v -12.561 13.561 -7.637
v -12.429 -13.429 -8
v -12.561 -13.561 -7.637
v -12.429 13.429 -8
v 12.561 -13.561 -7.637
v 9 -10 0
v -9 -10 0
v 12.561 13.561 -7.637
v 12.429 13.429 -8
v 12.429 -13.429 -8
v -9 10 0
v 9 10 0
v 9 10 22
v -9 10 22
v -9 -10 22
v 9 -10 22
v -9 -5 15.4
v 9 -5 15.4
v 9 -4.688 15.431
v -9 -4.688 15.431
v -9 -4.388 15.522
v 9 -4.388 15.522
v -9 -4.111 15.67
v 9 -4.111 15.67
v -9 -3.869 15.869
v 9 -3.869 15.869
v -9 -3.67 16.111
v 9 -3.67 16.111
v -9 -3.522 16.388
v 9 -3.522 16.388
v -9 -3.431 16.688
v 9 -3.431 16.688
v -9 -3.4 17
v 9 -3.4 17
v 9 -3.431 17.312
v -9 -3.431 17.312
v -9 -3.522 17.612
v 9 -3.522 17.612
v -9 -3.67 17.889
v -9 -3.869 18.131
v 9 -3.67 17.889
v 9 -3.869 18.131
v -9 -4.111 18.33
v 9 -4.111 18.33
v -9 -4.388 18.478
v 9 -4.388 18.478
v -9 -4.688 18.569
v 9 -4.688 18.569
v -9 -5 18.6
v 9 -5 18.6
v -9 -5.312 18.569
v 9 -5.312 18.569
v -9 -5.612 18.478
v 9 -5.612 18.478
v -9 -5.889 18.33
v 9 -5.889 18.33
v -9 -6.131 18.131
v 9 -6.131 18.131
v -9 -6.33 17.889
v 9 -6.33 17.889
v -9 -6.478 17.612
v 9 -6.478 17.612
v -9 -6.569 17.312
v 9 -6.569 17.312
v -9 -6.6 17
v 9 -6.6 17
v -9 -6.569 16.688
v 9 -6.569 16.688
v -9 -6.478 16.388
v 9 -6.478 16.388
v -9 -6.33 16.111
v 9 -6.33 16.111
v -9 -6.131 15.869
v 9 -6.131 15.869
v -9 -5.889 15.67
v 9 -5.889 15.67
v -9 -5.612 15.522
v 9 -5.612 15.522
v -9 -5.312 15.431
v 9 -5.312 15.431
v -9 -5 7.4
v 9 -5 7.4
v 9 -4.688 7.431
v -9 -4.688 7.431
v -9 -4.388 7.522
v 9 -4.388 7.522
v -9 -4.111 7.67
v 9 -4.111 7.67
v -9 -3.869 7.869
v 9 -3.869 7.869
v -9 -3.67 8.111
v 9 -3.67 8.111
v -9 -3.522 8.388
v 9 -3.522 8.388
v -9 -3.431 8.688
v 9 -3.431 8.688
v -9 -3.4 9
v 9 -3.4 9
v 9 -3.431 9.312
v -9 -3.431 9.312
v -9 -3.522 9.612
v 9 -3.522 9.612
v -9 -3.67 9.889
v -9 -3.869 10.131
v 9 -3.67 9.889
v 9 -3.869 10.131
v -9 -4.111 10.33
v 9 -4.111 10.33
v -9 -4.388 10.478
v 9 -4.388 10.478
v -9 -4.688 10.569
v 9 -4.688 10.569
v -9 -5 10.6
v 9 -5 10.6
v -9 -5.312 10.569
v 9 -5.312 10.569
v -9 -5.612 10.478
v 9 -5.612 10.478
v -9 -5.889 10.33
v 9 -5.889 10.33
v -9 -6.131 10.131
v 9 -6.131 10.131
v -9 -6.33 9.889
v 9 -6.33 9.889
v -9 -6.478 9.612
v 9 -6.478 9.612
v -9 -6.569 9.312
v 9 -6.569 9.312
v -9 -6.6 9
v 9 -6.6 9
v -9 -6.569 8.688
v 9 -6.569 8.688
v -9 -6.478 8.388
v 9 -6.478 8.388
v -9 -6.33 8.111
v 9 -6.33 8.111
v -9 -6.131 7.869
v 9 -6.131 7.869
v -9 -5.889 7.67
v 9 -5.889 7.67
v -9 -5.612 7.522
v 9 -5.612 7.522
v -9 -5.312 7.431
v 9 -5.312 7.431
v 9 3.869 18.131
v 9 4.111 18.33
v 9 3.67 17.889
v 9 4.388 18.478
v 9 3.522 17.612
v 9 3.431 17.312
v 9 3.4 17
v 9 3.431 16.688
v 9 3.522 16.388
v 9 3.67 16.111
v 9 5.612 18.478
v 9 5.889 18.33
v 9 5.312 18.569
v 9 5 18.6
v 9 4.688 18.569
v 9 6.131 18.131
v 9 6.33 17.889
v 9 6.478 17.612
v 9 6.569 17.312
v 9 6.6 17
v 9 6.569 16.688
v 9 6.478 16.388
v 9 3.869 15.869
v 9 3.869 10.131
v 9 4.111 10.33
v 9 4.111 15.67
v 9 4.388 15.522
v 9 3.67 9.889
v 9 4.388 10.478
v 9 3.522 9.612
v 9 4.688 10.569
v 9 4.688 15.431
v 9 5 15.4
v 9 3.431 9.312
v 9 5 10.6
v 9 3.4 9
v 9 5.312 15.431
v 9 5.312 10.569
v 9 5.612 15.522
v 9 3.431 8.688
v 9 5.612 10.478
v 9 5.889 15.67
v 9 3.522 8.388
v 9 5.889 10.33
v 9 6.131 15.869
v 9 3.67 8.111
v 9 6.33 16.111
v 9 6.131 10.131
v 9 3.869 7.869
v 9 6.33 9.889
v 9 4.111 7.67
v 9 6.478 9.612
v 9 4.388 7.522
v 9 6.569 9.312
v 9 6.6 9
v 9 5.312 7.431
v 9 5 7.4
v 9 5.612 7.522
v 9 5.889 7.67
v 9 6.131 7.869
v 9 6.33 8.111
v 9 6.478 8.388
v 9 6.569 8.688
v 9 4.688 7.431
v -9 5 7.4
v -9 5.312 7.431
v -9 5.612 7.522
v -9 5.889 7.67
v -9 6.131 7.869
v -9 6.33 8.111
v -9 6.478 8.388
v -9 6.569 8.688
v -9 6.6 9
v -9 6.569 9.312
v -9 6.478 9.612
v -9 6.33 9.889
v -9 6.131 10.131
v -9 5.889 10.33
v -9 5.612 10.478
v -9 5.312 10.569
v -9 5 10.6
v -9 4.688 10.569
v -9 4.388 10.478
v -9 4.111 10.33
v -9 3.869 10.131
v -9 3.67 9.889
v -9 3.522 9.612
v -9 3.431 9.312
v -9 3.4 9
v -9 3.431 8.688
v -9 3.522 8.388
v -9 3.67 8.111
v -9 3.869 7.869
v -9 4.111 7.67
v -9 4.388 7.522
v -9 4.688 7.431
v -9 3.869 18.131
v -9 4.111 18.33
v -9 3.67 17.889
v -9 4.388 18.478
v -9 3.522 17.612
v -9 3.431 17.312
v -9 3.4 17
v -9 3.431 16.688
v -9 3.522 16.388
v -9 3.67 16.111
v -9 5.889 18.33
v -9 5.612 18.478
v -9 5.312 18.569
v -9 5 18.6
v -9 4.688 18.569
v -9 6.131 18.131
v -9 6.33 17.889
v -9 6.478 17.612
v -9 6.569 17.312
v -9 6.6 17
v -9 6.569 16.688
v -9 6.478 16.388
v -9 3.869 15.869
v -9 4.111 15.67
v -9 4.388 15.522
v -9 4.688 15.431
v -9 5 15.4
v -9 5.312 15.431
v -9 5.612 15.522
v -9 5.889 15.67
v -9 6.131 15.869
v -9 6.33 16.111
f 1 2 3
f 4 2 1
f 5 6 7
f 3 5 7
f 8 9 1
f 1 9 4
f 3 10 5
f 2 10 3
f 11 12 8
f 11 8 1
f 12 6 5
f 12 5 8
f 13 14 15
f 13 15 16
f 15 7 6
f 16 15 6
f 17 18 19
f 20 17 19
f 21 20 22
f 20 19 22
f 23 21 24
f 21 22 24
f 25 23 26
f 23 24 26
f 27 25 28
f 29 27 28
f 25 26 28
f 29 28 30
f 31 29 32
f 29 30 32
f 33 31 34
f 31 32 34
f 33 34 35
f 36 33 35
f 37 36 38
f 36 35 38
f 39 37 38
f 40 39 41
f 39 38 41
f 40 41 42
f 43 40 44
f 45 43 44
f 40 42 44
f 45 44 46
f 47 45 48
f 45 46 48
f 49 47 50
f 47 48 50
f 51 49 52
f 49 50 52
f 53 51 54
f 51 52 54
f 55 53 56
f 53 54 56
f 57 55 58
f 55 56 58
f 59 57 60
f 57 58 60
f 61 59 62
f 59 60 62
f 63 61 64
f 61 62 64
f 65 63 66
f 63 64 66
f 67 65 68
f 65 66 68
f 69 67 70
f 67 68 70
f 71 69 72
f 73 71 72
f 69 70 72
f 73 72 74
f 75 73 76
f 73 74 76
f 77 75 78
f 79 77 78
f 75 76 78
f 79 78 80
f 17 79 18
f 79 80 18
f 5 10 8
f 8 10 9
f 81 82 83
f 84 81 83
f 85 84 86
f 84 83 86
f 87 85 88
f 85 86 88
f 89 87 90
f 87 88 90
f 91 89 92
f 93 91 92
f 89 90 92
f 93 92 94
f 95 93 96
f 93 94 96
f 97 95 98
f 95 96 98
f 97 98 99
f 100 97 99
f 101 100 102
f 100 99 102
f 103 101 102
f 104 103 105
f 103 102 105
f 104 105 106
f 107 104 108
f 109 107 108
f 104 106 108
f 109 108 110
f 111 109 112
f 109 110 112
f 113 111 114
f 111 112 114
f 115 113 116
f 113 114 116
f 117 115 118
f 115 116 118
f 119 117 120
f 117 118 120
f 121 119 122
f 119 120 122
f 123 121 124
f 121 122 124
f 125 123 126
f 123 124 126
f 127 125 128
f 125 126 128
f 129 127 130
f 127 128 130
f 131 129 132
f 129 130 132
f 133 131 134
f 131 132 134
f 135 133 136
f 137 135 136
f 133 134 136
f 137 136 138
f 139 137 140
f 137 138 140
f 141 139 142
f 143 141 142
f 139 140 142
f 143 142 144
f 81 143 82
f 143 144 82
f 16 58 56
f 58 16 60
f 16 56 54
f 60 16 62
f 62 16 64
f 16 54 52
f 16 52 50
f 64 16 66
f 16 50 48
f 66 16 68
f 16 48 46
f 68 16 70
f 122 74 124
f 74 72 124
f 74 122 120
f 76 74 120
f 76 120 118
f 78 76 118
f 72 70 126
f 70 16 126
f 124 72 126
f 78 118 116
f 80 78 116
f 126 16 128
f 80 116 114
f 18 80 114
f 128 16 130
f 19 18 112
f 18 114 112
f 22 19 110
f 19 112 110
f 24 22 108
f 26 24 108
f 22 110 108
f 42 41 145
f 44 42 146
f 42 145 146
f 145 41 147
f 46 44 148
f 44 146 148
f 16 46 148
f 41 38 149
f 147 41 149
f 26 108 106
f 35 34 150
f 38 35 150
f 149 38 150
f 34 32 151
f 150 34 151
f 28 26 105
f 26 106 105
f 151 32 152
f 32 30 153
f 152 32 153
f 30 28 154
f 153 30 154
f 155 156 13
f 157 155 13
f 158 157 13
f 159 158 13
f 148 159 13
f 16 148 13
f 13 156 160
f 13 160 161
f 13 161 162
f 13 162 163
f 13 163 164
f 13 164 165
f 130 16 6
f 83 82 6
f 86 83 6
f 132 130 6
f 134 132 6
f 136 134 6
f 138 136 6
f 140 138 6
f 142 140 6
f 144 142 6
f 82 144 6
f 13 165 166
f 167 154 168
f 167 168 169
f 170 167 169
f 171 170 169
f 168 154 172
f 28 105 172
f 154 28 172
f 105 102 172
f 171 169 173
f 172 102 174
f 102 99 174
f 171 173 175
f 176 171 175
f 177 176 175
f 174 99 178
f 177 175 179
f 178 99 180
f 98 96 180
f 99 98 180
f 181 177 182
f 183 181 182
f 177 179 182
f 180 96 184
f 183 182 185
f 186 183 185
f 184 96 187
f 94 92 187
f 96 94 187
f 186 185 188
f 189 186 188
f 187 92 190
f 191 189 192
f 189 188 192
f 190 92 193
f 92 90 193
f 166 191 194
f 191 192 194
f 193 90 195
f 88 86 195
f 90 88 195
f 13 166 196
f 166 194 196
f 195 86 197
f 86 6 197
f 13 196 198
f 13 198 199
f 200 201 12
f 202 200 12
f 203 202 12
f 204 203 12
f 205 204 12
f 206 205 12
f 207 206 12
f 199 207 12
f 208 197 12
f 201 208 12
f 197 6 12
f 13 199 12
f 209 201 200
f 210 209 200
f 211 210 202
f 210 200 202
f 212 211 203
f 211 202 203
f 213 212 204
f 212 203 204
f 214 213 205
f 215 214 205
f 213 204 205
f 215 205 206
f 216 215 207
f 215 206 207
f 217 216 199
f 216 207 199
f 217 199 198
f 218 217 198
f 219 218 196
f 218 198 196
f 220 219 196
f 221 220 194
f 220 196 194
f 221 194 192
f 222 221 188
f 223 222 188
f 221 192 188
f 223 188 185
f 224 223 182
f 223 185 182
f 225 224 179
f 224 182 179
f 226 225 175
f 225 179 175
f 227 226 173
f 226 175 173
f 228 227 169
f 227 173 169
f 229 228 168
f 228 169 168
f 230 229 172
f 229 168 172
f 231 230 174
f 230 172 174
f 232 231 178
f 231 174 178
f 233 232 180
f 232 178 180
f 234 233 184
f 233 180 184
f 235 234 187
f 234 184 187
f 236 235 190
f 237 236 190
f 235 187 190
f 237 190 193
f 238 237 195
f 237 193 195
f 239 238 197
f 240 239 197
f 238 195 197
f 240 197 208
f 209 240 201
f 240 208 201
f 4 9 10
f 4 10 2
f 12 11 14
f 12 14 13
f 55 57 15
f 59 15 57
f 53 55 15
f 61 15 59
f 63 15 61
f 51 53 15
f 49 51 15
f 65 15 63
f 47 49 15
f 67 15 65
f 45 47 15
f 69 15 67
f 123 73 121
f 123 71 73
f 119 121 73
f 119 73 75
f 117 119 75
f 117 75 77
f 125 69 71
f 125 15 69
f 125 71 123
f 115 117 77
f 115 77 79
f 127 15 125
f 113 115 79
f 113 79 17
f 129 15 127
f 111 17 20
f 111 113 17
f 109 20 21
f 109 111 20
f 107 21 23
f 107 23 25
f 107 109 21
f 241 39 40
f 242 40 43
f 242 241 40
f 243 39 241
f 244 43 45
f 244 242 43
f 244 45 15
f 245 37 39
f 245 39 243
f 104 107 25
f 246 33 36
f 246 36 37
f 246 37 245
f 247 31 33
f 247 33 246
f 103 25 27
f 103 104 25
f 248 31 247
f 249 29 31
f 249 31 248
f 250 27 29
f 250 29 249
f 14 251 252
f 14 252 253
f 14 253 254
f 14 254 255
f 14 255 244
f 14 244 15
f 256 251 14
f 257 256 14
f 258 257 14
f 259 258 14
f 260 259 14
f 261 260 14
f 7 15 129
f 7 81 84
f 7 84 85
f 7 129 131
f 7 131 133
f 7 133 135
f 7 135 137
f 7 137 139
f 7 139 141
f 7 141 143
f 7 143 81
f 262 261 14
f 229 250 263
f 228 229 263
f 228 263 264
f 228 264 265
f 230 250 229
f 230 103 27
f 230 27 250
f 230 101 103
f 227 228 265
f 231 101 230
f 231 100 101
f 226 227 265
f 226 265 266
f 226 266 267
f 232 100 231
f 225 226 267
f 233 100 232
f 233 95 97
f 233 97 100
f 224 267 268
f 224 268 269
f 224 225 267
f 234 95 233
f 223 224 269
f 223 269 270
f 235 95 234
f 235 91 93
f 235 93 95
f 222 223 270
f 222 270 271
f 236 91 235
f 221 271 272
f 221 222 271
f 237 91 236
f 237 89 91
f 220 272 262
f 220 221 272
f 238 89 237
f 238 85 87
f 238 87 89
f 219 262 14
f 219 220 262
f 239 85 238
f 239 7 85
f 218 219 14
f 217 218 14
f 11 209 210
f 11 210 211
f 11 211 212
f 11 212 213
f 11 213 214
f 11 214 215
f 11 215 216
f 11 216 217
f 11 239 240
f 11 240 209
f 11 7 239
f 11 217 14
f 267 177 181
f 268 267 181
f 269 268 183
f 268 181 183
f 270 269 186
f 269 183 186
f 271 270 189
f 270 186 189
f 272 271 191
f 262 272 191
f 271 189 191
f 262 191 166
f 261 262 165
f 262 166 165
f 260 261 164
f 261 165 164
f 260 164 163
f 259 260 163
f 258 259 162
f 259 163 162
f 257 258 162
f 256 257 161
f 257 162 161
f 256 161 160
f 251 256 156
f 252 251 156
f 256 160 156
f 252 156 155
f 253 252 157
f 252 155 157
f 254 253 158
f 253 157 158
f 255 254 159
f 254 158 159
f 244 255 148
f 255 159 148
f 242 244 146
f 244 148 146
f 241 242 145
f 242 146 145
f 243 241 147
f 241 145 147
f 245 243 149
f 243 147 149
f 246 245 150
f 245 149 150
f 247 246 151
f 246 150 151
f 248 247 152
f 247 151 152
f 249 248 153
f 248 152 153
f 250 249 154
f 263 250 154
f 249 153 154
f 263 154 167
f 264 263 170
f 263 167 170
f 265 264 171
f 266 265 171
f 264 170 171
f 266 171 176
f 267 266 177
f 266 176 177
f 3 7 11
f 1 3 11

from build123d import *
from OCP.BRepFilletAPI import BRepFilletAPI_MakeChamfer

# Parameters (mm, degrees)
SKETCH2_W           = 18
SKETCH2_H           = 20
BOSS_EXTRUDE1_DEPTH = 22
SKETCH3_W           = 18
SKETCH3_H           = 20
BOSS_EXTRUDE2_DEPTH = 8
BOSS_EXTRUDE2_DRAFT = -25
SKETCH4_R           = 1.6
CUT_EXTRUDE1_DEPTH  = 18
CHAMFER1_SIZE       = 0.4
CHAMFER1_SIZE2      = 0.300994928


with BuildPart() as part:
    # Sketch2 → Boss-Extrude1 (new body)
    with BuildSketch(Plane.XY):
        Rectangle(SKETCH2_W, SKETCH2_H)
    extrude(amount=BOSS_EXTRUDE1_DEPTH)


with BuildPart() as boss_extrude2_tool:
    # Sketch3 → Boss-Extrude2 (with draft: the straight prism first)
    with BuildSketch(Plane(origin=(0, 0, 0), x_dir=(-1, 0, 0), z_dir=(0, 0, -1))):
        Rectangle(SKETCH3_W, SKETCH3_H)
    extrude(amount=BOSS_EXTRUDE2_DEPTH)
    # Boss-Extrude2: the draft: its side faces are tilted about the plane it starts from
    boss_extrude2_sides = [boss_extrude2_tool.faces().sort_by_distance(p)[0] for p in [
        (9, 0, -4),
        (0, -10, -4),
        (-9, 0, -4),
        (0, 10, -4),
    ]]
    draft(boss_extrude2_sides, Plane(origin=(0, 0, 0), x_dir=(-1, 0, 0), z_dir=(0, 0, -1)), BOSS_EXTRUDE2_DRAFT)


with BuildPart() as part_1:
    add(part.part)

    # Boss-Extrude2: add boss_extrude2_tool
    add(boss_extrude2_tool.part)

    # Sketch4 → Cut-Extrude1 (cut)
    with BuildSketch(Plane(origin=(9, 0, 0), x_dir=(0, 0, -1), z_dir=(1, 0, 0))):
        with Locations((-17, 5)):
            Circle(SKETCH4_R)
        with Locations((-9, 5)):
            Circle(SKETCH4_R)
        with Locations((-17, -5)):
            Circle(SKETCH4_R)
        with Locations((-9, -5)):
            Circle(SKETCH4_R)
    extrude(amount=-CUT_EXTRUDE1_DEPTH, mode=Mode.SUBTRACT)

    # Chamfer1: one chamfer whose edges measure the first distance from different faces: ONE call of the kernel's chamfer builder (chamfer() names one face for all edges)
    chamfer1_edges_1 = [part_1.edges().sort_by_distance(p)[0] for p in [
        (0, 13.730461265, -8),
    ]]
    chamfer1_side_1 = [part_1.faces().sort_by_distance(p)[0] for p in [
        (0, 11.971965146, -4.228892903),
    ]]
    chamfer1_edges_2 = [part_1.edges().sort_by_distance(p)[0] for p in [
        (12.730461265, 0, -8),
    ]]
    chamfer1_side_2 = [part_1.faces().sort_by_distance(p)[0] for p in [
        (10.962969576, 0, -4.20960184),
    ]]
    chamfer1_edges_3 = [part_1.edges().sort_by_distance(p)[0] for p in [
        (0, -13.730461265, -8),
    ]]
    chamfer1_side_3 = [part_1.faces().sort_by_distance(p)[0] for p in [
        (0, -11.971965146, -4.228892903),
    ]]
    chamfer1_edges_4 = [part_1.edges().sort_by_distance(p)[0] for p in [
        (-12.730461265, 0, -8),
    ]]
    chamfer1_side_4 = [part_1.faces().sort_by_distance(p)[0] for p in [
        (-10.962969576, 0, -4.20960184),
    ]]
    chamfer1 = BRepFilletAPI_MakeChamfer(part_1.part.solid().wrapped)
    for e in chamfer1_edges_1:
        chamfer1.Add(CHAMFER1_SIZE, CHAMFER1_SIZE2, e.wrapped, chamfer1_side_1[0].wrapped)  # the first distance lies on this face
    for e in chamfer1_edges_2:
        chamfer1.Add(CHAMFER1_SIZE, CHAMFER1_SIZE2, e.wrapped, chamfer1_side_2[0].wrapped)  # the first distance lies on this face
    for e in chamfer1_edges_3:
        chamfer1.Add(CHAMFER1_SIZE, CHAMFER1_SIZE2, e.wrapped, chamfer1_side_3[0].wrapped)  # the first distance lies on this face
    for e in chamfer1_edges_4:
        chamfer1.Add(CHAMFER1_SIZE, CHAMFER1_SIZE2, e.wrapped, chamfer1_side_4[0].wrapped)  # the first distance lies on this face
    add(Compound.cast(chamfer1.Shape()), mode=Mode.REPLACE)


solid = part_1.part
